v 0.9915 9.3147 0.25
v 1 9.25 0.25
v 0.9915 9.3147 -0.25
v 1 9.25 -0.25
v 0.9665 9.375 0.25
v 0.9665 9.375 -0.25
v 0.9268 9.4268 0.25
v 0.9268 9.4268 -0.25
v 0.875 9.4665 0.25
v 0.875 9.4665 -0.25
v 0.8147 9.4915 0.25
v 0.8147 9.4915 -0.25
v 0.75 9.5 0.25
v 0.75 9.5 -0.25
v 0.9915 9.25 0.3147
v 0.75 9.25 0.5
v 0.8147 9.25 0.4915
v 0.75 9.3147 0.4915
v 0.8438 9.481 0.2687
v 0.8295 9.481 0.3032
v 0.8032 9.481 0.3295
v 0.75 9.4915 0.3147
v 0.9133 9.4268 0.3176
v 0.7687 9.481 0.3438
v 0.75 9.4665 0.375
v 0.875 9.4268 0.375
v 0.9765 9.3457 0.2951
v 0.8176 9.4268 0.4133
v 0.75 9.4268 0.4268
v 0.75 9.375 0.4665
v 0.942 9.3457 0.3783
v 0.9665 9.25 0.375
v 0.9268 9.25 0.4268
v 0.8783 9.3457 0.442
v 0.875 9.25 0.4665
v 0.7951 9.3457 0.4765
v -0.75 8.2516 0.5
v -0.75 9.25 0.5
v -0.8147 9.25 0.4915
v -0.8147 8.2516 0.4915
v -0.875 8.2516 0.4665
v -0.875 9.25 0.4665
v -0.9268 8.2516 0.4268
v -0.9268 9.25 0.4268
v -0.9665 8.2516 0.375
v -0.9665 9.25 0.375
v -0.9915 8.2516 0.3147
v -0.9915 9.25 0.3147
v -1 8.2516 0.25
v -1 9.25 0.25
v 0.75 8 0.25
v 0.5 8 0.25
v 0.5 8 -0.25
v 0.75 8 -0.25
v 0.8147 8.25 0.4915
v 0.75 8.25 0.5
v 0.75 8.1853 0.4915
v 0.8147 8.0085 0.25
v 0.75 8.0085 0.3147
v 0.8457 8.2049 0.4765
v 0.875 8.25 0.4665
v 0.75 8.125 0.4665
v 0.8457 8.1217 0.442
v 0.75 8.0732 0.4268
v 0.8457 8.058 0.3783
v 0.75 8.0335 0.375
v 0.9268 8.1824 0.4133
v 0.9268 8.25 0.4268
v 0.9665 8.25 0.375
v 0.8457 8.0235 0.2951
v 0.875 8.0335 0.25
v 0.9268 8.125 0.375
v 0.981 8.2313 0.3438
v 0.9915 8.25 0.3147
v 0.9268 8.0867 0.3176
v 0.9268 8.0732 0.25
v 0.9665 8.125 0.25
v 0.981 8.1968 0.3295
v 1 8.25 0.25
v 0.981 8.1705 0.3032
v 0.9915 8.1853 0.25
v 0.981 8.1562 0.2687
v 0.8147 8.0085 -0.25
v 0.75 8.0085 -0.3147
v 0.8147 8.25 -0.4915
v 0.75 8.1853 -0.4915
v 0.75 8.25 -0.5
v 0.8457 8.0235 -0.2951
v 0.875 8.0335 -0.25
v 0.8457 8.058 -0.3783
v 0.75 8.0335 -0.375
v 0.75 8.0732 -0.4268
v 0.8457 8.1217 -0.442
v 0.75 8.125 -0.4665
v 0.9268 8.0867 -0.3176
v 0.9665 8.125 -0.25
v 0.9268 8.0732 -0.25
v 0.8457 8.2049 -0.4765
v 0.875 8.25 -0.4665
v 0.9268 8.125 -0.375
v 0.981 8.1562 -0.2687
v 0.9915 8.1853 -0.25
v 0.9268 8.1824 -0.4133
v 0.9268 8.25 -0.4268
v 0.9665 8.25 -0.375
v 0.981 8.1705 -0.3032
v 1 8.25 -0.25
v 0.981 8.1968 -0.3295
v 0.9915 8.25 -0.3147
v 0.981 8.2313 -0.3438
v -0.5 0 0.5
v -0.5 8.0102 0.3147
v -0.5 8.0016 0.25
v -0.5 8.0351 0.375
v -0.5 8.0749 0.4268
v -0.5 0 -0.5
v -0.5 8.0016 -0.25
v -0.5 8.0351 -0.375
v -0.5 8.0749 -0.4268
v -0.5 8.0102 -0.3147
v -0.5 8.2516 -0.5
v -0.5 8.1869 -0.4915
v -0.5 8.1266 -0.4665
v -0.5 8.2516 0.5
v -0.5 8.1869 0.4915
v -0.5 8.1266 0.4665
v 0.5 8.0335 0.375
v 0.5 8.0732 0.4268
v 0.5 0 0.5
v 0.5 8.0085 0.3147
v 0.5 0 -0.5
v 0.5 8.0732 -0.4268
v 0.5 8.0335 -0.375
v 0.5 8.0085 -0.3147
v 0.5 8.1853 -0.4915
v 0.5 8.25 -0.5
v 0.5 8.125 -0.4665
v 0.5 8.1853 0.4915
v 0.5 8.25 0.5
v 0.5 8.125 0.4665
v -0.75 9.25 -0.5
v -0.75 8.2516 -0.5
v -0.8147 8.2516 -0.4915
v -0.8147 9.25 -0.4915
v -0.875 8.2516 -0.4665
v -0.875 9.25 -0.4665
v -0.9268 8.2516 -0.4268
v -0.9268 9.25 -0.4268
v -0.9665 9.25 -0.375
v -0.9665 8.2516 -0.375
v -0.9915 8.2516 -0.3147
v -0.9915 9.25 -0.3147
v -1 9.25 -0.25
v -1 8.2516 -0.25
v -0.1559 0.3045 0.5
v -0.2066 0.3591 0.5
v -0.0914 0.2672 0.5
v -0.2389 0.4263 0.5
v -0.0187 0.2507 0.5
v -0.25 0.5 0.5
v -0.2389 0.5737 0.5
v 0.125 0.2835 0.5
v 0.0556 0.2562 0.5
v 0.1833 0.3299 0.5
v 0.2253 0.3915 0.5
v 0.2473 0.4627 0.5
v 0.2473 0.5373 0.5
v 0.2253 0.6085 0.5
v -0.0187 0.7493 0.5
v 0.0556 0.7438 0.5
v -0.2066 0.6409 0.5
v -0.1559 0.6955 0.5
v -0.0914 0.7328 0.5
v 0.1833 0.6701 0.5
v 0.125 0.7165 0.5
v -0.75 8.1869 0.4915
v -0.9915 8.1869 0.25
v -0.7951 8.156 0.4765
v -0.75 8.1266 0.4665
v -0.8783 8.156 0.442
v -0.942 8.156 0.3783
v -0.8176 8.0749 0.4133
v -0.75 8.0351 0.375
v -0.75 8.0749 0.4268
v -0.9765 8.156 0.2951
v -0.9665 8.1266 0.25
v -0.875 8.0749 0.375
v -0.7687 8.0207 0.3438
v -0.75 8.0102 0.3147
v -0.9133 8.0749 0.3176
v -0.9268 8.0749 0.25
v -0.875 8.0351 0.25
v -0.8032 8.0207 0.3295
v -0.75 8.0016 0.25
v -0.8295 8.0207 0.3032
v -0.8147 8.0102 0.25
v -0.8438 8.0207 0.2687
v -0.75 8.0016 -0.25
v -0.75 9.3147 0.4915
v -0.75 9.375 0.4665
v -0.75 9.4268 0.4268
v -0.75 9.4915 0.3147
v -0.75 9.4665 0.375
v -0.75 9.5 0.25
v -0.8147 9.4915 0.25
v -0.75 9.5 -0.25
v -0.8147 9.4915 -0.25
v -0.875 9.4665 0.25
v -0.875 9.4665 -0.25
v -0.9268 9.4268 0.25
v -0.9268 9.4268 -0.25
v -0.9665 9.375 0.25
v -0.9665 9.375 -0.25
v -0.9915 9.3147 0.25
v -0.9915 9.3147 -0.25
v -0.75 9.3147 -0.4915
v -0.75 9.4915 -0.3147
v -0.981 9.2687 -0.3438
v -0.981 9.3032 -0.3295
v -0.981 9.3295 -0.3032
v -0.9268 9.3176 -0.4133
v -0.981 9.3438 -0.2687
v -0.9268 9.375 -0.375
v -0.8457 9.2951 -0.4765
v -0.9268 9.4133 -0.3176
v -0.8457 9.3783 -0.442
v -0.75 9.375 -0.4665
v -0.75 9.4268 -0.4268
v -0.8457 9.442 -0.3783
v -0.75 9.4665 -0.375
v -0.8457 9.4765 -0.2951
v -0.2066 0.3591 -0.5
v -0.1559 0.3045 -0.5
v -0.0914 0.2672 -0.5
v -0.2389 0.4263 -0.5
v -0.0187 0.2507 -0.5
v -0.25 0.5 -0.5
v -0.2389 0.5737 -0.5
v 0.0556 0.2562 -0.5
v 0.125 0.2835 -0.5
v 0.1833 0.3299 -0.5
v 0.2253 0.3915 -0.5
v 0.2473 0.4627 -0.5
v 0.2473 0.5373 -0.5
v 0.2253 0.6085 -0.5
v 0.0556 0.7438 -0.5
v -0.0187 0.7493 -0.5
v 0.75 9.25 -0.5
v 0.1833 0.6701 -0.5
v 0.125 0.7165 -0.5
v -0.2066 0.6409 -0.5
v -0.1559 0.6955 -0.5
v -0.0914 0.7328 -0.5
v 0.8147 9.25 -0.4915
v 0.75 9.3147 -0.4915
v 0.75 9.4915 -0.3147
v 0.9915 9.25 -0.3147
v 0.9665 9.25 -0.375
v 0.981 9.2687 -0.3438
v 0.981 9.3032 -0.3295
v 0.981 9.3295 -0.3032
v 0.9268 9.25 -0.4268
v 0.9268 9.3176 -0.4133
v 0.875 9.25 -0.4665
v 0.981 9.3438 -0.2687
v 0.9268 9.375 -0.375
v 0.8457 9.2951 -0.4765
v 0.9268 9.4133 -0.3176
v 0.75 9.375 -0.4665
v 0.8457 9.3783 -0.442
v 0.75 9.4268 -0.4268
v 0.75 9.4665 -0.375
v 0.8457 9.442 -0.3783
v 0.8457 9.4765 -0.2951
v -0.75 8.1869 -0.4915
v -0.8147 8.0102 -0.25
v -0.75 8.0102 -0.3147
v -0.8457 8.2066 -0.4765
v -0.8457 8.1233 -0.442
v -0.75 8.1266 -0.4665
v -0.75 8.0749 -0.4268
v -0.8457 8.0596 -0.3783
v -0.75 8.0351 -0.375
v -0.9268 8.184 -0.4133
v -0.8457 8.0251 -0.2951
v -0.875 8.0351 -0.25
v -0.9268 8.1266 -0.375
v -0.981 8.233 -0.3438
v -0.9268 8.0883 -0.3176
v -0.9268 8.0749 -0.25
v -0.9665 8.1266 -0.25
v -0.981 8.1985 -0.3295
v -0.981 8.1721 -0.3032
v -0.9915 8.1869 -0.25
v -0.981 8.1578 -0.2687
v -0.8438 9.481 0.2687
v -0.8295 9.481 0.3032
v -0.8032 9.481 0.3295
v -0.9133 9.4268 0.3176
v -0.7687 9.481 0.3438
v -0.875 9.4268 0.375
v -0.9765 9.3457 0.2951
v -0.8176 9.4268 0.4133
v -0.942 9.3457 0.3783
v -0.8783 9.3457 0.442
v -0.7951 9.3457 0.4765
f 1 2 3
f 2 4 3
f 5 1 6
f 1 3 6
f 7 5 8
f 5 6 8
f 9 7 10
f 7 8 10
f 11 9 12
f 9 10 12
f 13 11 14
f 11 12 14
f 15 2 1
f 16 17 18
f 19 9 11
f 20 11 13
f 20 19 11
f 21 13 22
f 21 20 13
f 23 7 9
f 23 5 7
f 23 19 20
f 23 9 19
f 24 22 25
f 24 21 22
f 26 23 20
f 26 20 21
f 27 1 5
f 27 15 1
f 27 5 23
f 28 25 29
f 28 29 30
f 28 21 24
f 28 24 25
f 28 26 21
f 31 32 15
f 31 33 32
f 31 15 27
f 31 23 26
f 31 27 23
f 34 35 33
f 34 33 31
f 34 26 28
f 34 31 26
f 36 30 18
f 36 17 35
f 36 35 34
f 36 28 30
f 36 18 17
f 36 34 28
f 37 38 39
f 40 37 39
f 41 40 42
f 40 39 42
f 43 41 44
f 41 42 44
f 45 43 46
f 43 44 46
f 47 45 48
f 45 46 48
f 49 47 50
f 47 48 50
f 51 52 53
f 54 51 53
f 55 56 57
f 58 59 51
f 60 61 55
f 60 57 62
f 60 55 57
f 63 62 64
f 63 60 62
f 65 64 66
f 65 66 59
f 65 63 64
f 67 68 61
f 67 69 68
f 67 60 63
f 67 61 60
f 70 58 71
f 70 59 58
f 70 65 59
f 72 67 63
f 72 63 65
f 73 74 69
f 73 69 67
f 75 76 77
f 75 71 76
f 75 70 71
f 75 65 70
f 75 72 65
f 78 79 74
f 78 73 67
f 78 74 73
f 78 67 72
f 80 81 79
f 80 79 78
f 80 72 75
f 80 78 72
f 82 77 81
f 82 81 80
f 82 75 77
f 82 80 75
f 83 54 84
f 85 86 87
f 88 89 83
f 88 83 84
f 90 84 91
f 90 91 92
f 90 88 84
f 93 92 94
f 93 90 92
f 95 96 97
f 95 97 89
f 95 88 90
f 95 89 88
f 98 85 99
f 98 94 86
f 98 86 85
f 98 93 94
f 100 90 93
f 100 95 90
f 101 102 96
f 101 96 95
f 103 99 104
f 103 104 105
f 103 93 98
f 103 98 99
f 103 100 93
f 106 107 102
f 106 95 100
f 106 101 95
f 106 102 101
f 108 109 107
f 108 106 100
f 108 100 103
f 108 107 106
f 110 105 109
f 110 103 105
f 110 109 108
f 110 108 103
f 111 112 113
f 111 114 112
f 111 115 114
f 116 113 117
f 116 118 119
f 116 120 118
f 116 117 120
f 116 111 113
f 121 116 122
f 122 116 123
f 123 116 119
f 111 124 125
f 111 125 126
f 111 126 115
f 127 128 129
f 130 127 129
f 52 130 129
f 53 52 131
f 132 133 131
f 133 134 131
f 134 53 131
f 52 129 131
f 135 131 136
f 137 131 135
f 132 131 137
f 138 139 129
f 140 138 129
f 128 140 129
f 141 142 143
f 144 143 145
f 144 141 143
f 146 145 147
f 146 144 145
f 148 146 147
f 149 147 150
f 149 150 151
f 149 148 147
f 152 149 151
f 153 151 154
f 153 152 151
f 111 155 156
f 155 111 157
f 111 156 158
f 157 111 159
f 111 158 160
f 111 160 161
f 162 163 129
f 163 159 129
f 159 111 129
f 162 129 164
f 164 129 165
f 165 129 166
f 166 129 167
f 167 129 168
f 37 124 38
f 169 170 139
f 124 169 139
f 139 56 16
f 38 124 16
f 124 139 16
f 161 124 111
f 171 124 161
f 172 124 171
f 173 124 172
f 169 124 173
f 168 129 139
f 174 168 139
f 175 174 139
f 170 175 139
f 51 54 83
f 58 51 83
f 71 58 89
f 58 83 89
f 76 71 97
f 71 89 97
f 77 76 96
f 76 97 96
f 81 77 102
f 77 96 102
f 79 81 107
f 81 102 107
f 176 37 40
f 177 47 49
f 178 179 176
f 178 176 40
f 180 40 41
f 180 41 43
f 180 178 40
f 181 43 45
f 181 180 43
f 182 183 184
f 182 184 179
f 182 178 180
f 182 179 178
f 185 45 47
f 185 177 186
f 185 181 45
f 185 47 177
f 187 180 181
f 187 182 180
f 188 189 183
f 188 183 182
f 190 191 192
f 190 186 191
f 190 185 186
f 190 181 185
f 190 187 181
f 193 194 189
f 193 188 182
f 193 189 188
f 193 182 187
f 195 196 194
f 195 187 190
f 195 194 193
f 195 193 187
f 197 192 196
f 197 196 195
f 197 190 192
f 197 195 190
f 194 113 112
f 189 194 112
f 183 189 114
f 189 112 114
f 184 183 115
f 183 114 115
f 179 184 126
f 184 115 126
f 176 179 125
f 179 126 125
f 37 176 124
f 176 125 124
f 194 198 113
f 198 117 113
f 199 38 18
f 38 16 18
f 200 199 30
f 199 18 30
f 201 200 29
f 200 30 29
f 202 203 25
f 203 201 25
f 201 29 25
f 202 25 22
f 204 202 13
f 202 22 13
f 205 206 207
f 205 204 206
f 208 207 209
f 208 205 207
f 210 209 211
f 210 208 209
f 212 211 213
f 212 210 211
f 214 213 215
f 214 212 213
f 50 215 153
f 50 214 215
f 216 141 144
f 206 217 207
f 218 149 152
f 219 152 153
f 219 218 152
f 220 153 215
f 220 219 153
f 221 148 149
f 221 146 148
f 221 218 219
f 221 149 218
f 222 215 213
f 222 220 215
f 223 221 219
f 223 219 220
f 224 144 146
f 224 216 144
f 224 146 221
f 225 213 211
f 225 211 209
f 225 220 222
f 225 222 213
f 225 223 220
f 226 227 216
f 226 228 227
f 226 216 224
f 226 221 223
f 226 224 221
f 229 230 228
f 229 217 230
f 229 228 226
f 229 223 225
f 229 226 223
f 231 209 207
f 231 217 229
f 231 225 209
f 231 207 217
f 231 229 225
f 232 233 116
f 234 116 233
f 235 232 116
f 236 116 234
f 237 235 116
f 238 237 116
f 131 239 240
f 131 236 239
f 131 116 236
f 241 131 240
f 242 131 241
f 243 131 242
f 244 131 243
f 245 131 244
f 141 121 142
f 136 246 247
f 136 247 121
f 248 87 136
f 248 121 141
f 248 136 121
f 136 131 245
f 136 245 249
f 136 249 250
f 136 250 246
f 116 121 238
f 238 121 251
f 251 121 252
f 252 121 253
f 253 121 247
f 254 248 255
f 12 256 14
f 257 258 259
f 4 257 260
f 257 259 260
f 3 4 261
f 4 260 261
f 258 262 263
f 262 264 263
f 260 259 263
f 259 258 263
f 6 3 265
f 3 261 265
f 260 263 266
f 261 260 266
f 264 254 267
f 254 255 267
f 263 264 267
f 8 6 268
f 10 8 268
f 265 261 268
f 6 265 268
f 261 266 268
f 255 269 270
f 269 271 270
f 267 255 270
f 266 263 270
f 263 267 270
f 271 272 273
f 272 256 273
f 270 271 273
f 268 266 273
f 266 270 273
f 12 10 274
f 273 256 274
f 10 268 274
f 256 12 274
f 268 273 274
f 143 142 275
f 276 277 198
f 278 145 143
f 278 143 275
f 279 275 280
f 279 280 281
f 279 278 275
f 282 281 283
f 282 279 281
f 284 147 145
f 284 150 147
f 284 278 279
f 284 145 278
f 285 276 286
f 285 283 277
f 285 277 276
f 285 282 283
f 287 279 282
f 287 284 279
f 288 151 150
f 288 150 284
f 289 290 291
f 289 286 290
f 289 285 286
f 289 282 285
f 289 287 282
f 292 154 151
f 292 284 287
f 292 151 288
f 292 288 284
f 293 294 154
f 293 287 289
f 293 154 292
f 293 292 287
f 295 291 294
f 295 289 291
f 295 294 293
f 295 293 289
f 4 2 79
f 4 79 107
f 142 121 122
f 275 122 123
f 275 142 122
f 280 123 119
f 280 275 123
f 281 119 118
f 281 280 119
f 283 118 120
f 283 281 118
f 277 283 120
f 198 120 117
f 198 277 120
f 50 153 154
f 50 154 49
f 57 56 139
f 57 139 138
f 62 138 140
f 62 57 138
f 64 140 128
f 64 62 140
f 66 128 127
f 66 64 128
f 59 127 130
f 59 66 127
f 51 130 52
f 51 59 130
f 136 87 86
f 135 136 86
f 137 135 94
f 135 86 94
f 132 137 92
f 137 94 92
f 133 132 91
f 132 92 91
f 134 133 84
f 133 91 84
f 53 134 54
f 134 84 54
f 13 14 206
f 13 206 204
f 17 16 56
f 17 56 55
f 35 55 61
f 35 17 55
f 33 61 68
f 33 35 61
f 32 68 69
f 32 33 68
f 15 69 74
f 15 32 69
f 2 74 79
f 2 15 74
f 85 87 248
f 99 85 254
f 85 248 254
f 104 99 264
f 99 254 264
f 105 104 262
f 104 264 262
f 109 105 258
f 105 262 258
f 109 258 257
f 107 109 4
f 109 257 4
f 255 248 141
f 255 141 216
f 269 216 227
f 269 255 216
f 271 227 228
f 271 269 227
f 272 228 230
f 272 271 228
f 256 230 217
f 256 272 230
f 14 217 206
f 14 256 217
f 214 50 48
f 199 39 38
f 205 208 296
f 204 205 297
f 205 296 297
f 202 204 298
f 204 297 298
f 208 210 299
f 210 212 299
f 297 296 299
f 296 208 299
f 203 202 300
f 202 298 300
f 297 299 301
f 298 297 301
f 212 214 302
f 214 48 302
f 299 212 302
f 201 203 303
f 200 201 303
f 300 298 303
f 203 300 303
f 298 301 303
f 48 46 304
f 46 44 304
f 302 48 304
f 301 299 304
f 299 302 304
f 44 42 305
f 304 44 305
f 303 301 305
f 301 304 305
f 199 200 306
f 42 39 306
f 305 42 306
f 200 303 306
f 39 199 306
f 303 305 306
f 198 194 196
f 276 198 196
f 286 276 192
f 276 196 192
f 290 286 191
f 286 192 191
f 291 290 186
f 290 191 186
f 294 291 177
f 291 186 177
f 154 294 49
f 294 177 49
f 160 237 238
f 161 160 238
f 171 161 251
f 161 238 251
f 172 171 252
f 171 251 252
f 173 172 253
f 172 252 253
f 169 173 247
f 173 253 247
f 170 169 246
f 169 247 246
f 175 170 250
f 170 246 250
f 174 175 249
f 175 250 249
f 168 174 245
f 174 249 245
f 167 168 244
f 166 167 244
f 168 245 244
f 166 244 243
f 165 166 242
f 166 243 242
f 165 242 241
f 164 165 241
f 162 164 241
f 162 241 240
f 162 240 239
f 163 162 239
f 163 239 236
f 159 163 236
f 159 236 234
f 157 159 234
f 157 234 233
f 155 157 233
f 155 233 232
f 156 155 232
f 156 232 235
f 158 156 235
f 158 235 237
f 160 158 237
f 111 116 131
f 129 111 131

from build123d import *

# Parameters (mm, degrees)
SZKIC1_W                    = 1
SZKIC1_H                    = 1
DODANIE_WYCI_GNI_CIE2_DEPTH = 9.5
SZKIC2_R                    = 0.250044668
WYTNIJ_WYCI_GNI_CIE1_DEPTH  = 9.5
SZKIC3_W                    = 1
SZKIC3_H                    = 1.5
DODANIE_WYCI_GNI_CIE3_DEPTH = 0.5
SZKIC4_W                    = 1
SZKIC4_H                    = 1.498354428
DODANIE_WYCI_GNI_CIE4_DEPTH = 0.5
ZAOKR_GLENIE1_R             = 0.25
ZAOKR_GLENIE2_R             = 0.25


with BuildPart() as part:
    # Szkic1 → Dodanie-wyciągnięcie2 (new body)
    with BuildSketch(Plane(origin=(0, 0, 0), x_dir=(1, 0, 0), z_dir=(0, 1, 0))):
        Rectangle(SZKIC1_W, SZKIC1_H)
    extrude(amount=DODANIE_WYCI_GNI_CIE2_DEPTH)

    # Szkic2 → Wytnij-wyciągnięcie1 (cut)
    with BuildSketch(Plane(origin=(0, 0, -0.5), x_dir=(-1, 0, 0), z_dir=(0, 0, -1))):
        with Locations((0, 0.5)):
            Circle(SZKIC2_R)
    extrude(amount=-WYTNIJ_WYCI_GNI_CIE1_DEPTH, mode=Mode.SUBTRACT)

    # Szkic3 → Dodanie-wyciągnięcie3 (add)
    with BuildSketch(Plane(origin=(0.5, 0, 0), x_dir=(0, 0, -1), z_dir=(1, 0, 0))):
        with Locations((0, 8.75)):
            Rectangle(SZKIC3_W, SZKIC3_H)
    extrude(amount=DODANIE_WYCI_GNI_CIE3_DEPTH)

    # Szkic4 → Dodanie-wyciągnięcie4 (add)
    with BuildSketch(Plane.ZY.offset(0.5)):
        with Locations((0, 8.750822786)):
            Rectangle(SZKIC4_W, SZKIC4_H)
    extrude(amount=DODANIE_WYCI_GNI_CIE4_DEPTH)

    # Zaokrąglenie1
    zaokr_glenie1_edges = [part.edges().sort_by_distance(p)[0] for p in [
        (0, 9.5, -0.5),
        (0.75, 8, 0.5),
        (0.75, 8, -0.5),
        (1, 8.75, 0.5),
        (1, 8.75, -0.5),
        (1, 9.5, 0),
        (-0.75, 8.001645572, -0.5),
        (-1, 8.750822786, -0.5),
        (-1, 8.750822786, 0.5),
        (-1, 9.5, 0),
        (0, 9.5, 0.5),
    ]]
    fillet(zaokr_glenie1_edges, radius=ZAOKR_GLENIE1_R)

    # Zaokrąglenie2
    # the kernel refuses this fillet: 0.25 mm, written as the material it takes off along each edge
    with BuildSketch(Plane(origin=(0.75, 8.25, -0.25), x_dir=(0, -1, 0), z_dir=(1, 0, 0))) as zaokr_glenie2_piece_1_section:
        Polygon((0, 0), (ZAOKR_GLENIE2_R, 0), (ZAOKR_GLENIE2_R, ZAOKR_GLENIE2_R), (0, ZAOKR_GLENIE2_R), align=None)
    zaokr_glenie2_piece_1 = extrude(amount=ZAOKR_GLENIE2_R, mode=Mode.PRIVATE)
    zaokr_glenie2_piece_1 = zaokr_glenie2_piece_1 - Plane(origin=(0.75, 8.25, -0.25), x_dir=(0, 0.7071067811865475, 0.7071067811865475), z_dir=(1, 0, 0)) * Sphere(ZAOKR_GLENIE2_R, mode=Mode.PRIVATE)
    add(zaokr_glenie2_piece_1, mode=Mode.SUBTRACT)
    with BuildSketch(Plane(origin=(-0.75, 8.251645572, -0.25), x_dir=(0, -1, 0), z_dir=(-1, 0, 0))) as zaokr_glenie2_piece_2_section:
        Polygon((0, 0), (ZAOKR_GLENIE2_R, 0), (ZAOKR_GLENIE2_R, -ZAOKR_GLENIE2_R), (0, -ZAOKR_GLENIE2_R), align=None)
    zaokr_glenie2_piece_2 = extrude(amount=ZAOKR_GLENIE2_R, mode=Mode.PRIVATE)
    zaokr_glenie2_piece_2 = zaokr_glenie2_piece_2 - Plane(origin=(-0.75, 8.251645572, -0.25), x_dir=(0, 0.7071067811865475, 0.7071067811865475), z_dir=(-1, 0, 0)) * Sphere(ZAOKR_GLENIE2_R, mode=Mode.PRIVATE)
    add(zaokr_glenie2_piece_2, mode=Mode.SUBTRACT)
    with BuildSketch(Plane(origin=(0.75, 8.25, 0.25), x_dir=(0, -1, 0), z_dir=(1, 0, 0))) as zaokr_glenie2_piece_3_section:
        Polygon((0, 0), (ZAOKR_GLENIE2_R, 0), (ZAOKR_GLENIE2_R, -ZAOKR_GLENIE2_R), (0, -ZAOKR_GLENIE2_R), align=None)
    zaokr_glenie2_piece_3 = extrude(amount=ZAOKR_GLENIE2_R, mode=Mode.PRIVATE)
    zaokr_glenie2_piece_3 = zaokr_glenie2_piece_3 - Plane(origin=(0.75, 8.25, 0.25), x_dir=(0, 0.7071067811865475, -0.7071067811865475), z_dir=(1, 0, 0)) * Sphere(ZAOKR_GLENIE2_R, mode=Mode.PRIVATE)
    add(zaokr_glenie2_piece_3, mode=Mode.SUBTRACT)
    with BuildSketch(Plane(origin=(-1, 8.001645572, 0.25), x_dir=(0, 1, 0), z_dir=(0, 0, -1)), Plane(origin=(1, 8, -0.25), x_dir=(0, 1, 0), z_dir=(0, 0, 1))) as zaokr_glenie2_piece_4:
        with BuildLine():
            CenterArc((ZAOKR_GLENIE2_R, ZAOKR_GLENIE2_R), ZAOKR_GLENIE2_R, 180, 90)
            Line((0, ZAOKR_GLENIE2_R), (0, 0))
            Line((0, 0), (ZAOKR_GLENIE2_R, 0))
        make_face()
    extrude(amount=0.5, mode=Mode.SUBTRACT)
    with BuildSketch(Plane(origin=(-0.5, 8.001645572, 0.5), x_dir=(0, 1, 0), z_dir=(-1, 0, 0))) as zaokr_glenie2_piece_5:
        with BuildLine():
            CenterArc((ZAOKR_GLENIE2_R, ZAOKR_GLENIE2_R), ZAOKR_GLENIE2_R, 180, 90)
            Line((0, ZAOKR_GLENIE2_R), (0, 0))
            Line((0, 0), (ZAOKR_GLENIE2_R, 0))
        make_face()
    extrude(amount=0.25, mode=Mode.SUBTRACT)
    with BuildSketch(Plane(origin=(-0.75, 8.001645572, 0.25), x_dir=(0, 0, 1), z_dir=(1, 0, 0))) as zaokr_glenie2_piece_6:
        with BuildLine():
            CenterArc((0.25 - ZAOKR_GLENIE2_R, -ZAOKR_GLENIE2_R), ZAOKR_GLENIE2_R, 0, 90)
            Line((0.25 - ZAOKR_GLENIE2_R, 0), (0.25, 0))
            Line((0.25, 0), (0.25, -ZAOKR_GLENIE2_R))
        make_face()
    revolve(axis=Axis((-0.75, 8.001645572, 0.25), (0, -1, 0)), revolution_arc=90, mode=Mode.SUBTRACT)


solid = part.part
